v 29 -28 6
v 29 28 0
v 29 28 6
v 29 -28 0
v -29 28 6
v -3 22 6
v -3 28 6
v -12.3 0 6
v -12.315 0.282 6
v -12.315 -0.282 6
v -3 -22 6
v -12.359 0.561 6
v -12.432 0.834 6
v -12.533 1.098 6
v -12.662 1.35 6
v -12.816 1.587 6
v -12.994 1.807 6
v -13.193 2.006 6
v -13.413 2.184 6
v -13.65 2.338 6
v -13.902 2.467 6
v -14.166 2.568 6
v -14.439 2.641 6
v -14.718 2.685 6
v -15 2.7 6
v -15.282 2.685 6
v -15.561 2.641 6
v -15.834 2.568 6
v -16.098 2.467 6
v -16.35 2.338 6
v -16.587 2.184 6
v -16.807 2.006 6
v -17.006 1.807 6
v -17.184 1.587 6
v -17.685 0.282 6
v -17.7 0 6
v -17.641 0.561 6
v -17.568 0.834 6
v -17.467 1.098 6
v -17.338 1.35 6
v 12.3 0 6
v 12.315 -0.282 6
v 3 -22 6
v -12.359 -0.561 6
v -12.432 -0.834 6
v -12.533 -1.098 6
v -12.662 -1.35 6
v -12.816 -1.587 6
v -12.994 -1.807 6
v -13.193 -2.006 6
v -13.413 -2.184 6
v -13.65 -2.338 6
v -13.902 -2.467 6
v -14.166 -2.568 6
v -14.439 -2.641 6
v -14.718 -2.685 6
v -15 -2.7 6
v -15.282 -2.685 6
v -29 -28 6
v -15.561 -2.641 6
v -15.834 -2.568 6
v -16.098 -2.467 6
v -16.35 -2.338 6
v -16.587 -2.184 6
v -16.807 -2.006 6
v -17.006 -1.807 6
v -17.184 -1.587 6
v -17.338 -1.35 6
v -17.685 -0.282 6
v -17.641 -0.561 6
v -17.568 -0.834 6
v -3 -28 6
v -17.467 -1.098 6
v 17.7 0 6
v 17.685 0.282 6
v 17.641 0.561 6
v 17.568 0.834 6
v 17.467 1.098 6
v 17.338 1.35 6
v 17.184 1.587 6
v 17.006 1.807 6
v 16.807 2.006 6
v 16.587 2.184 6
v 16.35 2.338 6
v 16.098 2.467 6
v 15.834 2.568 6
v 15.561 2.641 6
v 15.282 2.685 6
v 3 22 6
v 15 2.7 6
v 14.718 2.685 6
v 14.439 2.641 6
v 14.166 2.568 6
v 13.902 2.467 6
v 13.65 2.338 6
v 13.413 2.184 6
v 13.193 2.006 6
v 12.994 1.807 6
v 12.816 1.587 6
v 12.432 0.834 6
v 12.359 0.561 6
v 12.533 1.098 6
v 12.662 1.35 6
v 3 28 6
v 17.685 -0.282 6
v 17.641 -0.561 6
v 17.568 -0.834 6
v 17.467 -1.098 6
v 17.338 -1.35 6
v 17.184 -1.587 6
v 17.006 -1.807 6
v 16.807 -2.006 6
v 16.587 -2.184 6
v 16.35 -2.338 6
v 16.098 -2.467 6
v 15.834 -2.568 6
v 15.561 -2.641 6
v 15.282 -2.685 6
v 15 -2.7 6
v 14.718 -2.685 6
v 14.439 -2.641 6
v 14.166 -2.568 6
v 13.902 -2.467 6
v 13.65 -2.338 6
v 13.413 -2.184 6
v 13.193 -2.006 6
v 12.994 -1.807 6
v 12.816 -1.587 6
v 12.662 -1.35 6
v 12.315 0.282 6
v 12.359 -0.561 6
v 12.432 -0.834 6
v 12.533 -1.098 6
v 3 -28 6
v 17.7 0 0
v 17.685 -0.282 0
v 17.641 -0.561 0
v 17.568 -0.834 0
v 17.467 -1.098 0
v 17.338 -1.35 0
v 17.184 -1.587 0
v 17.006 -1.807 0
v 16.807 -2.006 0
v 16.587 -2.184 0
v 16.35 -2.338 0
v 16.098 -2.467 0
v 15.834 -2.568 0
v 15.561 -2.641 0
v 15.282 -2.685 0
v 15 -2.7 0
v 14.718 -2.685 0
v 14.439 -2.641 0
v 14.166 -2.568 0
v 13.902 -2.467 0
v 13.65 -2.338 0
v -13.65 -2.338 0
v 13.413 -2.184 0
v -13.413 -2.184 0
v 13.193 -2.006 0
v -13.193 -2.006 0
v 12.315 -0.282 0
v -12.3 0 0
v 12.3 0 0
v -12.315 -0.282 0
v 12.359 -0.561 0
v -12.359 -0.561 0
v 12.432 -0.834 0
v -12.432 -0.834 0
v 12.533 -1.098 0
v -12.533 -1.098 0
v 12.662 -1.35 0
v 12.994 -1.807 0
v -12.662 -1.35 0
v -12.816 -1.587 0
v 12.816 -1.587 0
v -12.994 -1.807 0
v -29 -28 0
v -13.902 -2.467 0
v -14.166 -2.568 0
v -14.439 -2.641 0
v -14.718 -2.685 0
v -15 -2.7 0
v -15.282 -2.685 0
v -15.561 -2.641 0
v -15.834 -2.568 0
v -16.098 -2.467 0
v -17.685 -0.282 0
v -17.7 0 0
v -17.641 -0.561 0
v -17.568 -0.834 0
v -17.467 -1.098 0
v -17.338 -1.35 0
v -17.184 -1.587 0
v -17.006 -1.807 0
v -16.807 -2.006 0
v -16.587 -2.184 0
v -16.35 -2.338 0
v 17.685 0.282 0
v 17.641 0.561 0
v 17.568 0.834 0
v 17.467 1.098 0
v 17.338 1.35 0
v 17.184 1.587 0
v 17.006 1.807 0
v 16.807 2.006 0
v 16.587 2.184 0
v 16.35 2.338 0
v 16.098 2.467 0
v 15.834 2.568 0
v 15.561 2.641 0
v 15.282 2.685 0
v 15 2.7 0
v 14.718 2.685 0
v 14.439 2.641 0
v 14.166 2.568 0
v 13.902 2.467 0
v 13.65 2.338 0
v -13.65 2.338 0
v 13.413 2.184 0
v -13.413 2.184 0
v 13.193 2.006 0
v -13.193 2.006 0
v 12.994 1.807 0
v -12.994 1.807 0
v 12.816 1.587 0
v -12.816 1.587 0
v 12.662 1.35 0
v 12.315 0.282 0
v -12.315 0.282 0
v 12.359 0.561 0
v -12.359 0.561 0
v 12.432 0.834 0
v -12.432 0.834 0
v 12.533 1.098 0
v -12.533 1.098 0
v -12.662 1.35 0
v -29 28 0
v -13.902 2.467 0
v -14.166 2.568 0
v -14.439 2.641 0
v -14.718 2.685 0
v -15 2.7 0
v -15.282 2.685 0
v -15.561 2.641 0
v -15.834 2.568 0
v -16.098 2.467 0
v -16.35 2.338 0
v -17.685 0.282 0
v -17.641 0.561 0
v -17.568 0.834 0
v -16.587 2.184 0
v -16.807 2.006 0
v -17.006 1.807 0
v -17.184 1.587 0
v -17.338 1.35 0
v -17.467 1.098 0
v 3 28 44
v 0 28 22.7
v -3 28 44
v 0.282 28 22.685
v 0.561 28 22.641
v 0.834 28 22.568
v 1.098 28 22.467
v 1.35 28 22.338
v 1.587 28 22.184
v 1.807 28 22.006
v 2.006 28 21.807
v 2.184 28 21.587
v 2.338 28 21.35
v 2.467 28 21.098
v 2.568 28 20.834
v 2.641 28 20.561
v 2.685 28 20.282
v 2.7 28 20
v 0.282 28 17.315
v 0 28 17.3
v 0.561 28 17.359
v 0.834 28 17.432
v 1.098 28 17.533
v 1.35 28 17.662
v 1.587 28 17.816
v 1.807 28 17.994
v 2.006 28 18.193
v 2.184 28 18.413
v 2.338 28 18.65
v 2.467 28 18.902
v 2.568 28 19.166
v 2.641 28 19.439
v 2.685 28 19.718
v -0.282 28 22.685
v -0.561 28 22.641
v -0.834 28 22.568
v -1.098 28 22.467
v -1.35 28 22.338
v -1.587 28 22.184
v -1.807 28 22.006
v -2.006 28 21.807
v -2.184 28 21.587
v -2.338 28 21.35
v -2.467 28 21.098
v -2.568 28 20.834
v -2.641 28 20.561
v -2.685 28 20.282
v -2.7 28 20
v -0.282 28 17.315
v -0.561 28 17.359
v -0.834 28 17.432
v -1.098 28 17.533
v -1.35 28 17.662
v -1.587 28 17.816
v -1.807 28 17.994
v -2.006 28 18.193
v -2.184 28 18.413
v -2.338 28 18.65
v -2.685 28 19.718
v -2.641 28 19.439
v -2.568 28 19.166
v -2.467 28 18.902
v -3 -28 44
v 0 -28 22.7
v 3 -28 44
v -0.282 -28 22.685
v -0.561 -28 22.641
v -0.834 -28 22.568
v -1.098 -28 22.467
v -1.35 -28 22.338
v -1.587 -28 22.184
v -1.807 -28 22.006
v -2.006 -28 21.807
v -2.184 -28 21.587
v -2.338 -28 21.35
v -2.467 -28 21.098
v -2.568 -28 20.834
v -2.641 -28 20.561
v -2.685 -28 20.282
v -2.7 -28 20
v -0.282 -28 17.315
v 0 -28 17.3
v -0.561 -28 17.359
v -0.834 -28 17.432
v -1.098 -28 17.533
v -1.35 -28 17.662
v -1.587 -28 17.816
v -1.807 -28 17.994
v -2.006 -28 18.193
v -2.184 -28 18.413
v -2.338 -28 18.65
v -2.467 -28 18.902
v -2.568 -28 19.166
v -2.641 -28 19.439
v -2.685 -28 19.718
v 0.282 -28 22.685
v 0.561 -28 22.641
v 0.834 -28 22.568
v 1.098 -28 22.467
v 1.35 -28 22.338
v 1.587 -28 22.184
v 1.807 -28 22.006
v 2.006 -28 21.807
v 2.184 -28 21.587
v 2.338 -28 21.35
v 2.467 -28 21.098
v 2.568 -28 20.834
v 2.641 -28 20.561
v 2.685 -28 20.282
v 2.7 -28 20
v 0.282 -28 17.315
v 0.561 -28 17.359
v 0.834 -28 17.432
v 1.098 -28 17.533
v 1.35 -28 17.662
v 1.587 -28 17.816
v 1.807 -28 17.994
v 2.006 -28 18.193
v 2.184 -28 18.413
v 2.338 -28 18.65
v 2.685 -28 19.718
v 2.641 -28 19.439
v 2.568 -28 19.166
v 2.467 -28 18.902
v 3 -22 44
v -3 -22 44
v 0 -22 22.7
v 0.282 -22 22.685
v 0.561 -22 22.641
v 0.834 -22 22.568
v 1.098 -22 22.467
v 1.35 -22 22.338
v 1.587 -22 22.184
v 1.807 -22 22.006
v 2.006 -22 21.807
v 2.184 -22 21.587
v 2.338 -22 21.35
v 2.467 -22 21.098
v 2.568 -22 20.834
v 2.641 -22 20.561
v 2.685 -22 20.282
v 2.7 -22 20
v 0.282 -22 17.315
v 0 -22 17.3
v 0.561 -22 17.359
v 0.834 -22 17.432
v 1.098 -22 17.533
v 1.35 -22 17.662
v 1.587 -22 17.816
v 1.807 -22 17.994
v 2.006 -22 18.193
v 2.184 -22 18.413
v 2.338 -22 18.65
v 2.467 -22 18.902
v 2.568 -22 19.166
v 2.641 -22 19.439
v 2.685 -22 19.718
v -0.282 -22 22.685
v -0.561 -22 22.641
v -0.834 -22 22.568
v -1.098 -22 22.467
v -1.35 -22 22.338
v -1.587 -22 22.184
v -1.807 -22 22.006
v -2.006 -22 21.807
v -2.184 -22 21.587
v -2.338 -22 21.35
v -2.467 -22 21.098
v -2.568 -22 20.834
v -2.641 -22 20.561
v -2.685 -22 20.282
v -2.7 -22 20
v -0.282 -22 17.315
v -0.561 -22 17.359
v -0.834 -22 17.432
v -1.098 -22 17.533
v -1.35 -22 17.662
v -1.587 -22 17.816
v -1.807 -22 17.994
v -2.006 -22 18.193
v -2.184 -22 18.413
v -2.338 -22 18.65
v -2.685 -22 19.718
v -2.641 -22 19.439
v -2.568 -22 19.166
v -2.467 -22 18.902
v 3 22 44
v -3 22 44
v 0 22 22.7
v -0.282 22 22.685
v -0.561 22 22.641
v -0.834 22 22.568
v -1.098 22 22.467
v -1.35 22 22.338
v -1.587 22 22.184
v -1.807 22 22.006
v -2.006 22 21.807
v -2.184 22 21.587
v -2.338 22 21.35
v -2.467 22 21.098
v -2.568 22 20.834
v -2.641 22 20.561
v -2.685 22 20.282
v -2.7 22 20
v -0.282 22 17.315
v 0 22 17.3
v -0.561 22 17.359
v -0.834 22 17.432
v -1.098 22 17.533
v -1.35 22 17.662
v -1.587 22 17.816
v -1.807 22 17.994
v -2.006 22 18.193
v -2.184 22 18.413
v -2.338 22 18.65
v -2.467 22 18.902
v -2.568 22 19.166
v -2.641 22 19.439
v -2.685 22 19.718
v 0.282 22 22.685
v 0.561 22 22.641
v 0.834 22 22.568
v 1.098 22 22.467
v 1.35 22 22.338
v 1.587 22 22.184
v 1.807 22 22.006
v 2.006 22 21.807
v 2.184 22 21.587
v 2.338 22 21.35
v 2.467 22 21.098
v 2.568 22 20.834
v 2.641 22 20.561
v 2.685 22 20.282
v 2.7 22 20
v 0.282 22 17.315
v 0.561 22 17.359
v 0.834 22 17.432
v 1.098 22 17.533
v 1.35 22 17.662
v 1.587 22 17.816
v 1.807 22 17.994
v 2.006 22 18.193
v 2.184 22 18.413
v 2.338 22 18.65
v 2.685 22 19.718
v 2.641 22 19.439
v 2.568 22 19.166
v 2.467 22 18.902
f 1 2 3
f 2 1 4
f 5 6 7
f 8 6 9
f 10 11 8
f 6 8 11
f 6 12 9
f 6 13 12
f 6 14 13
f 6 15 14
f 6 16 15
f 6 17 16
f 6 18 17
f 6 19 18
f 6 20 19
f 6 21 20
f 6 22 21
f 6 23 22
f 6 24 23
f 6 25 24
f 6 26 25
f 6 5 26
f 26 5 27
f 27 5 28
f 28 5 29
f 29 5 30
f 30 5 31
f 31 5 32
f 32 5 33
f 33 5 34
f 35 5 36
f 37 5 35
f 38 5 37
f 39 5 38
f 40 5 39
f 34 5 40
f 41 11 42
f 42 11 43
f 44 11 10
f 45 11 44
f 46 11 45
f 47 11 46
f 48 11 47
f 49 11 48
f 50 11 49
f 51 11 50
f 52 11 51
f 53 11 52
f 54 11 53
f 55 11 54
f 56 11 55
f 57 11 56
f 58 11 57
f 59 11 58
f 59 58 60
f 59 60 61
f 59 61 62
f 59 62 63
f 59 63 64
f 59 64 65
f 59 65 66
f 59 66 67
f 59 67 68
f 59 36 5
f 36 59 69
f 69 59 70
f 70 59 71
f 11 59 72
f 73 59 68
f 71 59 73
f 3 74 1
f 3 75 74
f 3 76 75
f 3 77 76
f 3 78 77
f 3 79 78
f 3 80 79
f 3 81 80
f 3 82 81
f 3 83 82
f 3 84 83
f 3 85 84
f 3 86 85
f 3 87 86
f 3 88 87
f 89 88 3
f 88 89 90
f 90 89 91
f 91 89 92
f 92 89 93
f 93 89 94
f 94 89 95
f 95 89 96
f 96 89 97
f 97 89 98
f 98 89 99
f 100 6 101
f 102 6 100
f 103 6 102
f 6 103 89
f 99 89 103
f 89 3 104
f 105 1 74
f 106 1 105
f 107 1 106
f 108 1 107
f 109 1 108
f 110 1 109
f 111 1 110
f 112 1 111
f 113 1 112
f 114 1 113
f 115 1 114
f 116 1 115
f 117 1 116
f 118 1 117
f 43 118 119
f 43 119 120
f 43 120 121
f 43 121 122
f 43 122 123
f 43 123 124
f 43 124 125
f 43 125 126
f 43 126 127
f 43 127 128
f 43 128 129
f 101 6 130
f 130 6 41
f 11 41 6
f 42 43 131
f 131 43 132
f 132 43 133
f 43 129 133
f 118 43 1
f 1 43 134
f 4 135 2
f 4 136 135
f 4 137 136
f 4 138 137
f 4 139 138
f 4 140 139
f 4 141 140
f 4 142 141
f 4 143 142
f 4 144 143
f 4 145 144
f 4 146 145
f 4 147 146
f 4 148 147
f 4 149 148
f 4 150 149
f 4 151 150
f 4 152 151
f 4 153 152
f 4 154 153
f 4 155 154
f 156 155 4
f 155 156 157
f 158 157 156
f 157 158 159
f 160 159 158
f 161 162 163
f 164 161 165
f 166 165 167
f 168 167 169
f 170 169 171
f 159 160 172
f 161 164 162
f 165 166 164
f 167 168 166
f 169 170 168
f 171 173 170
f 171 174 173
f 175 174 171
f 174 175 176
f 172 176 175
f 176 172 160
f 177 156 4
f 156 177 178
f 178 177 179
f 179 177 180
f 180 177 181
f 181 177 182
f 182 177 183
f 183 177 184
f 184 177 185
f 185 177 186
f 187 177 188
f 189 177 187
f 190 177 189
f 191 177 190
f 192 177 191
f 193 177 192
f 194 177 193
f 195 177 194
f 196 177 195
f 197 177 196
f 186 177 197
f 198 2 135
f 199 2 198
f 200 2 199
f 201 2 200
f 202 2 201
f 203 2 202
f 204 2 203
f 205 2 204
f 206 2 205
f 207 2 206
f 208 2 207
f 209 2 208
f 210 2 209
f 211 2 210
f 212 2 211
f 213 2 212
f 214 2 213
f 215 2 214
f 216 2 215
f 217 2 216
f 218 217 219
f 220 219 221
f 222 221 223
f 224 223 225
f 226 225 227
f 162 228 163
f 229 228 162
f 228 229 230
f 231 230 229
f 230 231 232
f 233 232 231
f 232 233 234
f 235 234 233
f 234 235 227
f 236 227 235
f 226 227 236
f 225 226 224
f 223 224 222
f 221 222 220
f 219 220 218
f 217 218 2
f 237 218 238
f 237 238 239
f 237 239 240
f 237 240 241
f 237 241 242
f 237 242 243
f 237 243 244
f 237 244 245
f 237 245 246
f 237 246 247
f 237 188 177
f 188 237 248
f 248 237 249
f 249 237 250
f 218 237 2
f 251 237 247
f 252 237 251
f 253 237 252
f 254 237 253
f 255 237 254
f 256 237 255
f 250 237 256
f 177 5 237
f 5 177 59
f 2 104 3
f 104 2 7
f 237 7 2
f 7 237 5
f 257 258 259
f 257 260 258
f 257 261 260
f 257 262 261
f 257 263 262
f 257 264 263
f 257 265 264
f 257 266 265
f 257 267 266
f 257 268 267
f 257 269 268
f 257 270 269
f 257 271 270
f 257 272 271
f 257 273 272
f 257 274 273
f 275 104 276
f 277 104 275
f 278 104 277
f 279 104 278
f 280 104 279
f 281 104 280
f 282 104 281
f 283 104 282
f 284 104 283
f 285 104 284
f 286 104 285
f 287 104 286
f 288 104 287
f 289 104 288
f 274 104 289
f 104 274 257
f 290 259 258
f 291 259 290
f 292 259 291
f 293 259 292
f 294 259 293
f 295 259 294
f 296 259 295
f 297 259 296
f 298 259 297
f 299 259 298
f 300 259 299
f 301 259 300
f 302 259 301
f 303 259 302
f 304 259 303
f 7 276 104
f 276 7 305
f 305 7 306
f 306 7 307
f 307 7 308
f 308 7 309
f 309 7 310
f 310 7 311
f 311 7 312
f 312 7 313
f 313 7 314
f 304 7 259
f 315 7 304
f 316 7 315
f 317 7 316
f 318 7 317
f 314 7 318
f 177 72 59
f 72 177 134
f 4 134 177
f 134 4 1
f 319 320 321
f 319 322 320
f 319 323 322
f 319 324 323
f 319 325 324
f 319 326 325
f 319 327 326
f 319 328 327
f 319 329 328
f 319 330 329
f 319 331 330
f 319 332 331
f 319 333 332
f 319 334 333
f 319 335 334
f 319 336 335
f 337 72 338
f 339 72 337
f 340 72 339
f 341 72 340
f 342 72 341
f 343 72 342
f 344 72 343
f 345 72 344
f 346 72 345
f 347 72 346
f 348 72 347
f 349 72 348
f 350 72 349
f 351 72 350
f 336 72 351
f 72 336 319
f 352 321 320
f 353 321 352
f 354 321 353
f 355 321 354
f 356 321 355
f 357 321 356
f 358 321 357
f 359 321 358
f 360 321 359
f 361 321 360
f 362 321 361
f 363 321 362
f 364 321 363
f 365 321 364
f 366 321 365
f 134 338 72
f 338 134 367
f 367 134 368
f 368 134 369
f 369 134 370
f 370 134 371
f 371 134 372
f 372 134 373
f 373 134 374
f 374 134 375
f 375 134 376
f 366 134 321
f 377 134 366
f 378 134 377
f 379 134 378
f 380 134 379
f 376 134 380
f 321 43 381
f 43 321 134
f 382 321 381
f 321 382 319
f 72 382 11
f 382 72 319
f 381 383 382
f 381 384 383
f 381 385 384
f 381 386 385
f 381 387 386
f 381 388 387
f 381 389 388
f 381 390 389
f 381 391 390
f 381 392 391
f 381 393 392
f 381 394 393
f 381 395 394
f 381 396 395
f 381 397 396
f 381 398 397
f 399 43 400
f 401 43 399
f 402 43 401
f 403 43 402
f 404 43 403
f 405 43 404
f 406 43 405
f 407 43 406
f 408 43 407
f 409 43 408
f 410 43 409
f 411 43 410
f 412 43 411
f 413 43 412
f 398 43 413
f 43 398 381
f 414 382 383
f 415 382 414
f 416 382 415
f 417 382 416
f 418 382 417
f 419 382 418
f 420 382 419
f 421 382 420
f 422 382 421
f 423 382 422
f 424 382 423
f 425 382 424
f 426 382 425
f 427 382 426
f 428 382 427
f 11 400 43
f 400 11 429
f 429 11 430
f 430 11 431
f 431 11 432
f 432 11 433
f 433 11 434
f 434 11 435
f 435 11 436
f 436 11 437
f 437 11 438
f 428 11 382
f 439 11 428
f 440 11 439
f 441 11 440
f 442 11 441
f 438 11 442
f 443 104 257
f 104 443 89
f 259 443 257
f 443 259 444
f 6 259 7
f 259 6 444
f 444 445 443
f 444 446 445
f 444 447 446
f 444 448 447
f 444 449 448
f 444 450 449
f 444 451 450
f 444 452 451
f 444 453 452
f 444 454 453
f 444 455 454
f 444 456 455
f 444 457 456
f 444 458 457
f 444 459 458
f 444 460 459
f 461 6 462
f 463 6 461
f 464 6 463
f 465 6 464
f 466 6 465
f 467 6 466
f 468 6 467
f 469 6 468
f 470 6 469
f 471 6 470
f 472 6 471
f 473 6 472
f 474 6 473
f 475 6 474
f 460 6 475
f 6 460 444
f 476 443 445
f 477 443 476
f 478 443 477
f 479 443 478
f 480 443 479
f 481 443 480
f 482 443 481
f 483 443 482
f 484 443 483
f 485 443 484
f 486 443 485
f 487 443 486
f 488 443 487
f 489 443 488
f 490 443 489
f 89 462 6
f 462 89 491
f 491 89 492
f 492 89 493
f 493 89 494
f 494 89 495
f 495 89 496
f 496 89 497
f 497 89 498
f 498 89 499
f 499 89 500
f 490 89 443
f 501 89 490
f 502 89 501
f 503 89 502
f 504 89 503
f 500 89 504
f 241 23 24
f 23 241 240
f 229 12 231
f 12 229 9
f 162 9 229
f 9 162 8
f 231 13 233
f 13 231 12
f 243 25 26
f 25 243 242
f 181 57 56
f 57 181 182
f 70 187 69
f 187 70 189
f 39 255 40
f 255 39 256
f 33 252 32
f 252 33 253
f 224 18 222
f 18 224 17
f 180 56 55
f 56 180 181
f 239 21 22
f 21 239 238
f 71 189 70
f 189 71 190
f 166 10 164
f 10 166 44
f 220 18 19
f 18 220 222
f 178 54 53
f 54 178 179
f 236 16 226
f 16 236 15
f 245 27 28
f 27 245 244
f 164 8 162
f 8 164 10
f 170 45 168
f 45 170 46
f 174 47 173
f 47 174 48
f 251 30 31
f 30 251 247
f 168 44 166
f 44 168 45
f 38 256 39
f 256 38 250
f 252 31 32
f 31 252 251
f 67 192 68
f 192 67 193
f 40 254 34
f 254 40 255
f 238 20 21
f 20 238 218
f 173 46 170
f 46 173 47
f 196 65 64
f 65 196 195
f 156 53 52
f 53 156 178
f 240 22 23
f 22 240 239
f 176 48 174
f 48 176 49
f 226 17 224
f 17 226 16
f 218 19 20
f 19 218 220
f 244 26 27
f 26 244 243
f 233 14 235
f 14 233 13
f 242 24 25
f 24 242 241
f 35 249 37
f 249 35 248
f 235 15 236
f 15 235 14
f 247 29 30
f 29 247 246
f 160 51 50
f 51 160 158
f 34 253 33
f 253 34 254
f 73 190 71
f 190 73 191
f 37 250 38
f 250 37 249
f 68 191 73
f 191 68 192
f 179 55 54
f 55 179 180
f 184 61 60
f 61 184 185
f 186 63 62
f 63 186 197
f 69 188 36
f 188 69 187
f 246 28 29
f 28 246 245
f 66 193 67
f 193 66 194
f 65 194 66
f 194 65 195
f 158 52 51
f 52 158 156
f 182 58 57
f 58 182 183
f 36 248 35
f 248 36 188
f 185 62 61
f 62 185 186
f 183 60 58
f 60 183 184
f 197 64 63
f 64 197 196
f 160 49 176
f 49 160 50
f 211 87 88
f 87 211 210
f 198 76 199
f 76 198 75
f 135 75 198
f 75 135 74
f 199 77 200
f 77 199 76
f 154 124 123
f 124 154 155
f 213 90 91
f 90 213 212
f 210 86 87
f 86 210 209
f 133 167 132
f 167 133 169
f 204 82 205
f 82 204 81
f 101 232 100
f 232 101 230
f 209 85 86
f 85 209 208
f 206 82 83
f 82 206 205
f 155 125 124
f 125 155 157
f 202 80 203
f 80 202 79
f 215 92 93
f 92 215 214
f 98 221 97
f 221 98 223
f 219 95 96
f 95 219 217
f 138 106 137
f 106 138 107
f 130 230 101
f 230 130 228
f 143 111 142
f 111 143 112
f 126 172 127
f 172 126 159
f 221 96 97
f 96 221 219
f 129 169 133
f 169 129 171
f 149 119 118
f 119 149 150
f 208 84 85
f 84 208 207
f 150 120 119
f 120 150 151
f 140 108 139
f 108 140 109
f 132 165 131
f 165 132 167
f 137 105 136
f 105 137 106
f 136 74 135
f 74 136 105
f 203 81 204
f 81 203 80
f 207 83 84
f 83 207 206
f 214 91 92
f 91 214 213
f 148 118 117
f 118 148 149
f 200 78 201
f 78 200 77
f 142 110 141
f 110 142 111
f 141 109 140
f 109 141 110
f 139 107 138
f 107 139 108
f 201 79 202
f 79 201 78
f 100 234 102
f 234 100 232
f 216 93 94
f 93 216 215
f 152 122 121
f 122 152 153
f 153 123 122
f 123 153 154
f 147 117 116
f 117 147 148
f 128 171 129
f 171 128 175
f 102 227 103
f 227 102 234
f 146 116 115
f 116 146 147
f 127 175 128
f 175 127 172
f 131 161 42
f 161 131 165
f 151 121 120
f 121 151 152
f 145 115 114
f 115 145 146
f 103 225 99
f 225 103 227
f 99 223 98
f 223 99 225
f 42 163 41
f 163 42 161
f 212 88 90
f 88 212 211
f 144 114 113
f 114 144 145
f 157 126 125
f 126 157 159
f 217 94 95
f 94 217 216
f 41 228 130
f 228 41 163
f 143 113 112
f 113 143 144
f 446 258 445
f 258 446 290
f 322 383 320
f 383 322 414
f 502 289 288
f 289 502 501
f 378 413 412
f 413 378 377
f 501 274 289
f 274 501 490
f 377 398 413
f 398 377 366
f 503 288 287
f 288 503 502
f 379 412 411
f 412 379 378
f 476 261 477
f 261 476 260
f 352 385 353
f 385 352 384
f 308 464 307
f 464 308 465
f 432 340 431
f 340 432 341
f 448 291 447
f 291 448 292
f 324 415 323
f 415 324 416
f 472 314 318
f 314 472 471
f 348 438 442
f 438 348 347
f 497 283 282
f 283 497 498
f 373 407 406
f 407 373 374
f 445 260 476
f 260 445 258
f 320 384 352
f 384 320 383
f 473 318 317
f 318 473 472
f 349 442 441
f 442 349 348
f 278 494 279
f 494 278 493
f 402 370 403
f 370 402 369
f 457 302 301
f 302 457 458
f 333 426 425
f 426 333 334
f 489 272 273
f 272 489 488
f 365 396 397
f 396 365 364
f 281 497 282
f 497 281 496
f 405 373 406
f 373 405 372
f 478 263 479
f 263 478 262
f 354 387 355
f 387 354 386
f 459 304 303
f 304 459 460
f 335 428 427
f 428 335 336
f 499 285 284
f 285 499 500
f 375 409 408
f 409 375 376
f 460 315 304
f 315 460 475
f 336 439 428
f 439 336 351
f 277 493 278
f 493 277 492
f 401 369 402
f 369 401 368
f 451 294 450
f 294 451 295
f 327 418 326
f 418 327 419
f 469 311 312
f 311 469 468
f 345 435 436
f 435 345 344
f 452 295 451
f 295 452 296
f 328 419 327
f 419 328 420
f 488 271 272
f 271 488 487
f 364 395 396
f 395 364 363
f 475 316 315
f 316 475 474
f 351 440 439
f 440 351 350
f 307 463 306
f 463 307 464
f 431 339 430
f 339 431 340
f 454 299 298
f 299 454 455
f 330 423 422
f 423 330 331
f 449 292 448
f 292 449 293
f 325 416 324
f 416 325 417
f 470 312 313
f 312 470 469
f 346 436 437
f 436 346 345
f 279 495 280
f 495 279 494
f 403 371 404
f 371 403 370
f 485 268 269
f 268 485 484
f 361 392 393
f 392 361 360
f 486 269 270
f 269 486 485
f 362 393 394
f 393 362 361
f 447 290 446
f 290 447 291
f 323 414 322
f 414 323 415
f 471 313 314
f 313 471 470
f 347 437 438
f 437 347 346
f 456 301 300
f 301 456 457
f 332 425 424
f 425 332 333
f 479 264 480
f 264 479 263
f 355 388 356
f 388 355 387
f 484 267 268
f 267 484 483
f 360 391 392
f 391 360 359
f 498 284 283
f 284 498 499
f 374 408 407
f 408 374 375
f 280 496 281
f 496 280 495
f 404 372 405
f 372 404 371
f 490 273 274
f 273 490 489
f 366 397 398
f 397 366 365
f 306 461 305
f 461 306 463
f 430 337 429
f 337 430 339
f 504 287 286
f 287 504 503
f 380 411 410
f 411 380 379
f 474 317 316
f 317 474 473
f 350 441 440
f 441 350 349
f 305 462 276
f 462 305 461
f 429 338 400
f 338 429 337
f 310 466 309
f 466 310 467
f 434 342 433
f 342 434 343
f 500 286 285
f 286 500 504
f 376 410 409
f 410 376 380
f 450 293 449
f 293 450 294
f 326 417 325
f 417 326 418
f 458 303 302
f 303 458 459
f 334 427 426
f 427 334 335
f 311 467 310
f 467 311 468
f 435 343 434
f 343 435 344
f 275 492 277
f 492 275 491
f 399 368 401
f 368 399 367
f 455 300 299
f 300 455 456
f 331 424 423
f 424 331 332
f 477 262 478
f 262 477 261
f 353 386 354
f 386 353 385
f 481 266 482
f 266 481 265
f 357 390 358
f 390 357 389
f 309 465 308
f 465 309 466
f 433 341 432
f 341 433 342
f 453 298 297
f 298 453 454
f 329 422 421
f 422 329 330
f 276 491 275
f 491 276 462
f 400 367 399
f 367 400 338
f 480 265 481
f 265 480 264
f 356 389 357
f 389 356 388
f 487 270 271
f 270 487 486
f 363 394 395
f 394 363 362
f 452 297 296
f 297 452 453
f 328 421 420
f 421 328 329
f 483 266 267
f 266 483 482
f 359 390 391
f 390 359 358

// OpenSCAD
// Clevis mounting bracket for M5 pin.
$fn = 60;
eps = 0.02;
opening = 44;
ear_h = 40;
base_l = 58;
base_w = opening + 12;
base_t = 6;
ear_t = 6;
difference() {
    union() {
        translate([-base_l / 2, -base_w / 2, 0]) cube([base_l, base_w, base_t]);
        translate([-ear_t / 2, -base_w / 2, base_t - 2]) cube([ear_t, ear_t, ear_h]);
        translate([-ear_t / 2, base_w / 2 - ear_t, base_t - 2]) cube([ear_t, ear_t, ear_h]);
    }
    for (x = [-15, 15]) translate([x, 0, -eps]) cylinder(d = 5.4, h = base_t + 2 * eps);
    translate([0, -base_w / 2 - eps, ear_h / 2]) rotate([-90, 0, 0]) cylinder(d = 5.4, h = base_w + 2 * eps);
}
